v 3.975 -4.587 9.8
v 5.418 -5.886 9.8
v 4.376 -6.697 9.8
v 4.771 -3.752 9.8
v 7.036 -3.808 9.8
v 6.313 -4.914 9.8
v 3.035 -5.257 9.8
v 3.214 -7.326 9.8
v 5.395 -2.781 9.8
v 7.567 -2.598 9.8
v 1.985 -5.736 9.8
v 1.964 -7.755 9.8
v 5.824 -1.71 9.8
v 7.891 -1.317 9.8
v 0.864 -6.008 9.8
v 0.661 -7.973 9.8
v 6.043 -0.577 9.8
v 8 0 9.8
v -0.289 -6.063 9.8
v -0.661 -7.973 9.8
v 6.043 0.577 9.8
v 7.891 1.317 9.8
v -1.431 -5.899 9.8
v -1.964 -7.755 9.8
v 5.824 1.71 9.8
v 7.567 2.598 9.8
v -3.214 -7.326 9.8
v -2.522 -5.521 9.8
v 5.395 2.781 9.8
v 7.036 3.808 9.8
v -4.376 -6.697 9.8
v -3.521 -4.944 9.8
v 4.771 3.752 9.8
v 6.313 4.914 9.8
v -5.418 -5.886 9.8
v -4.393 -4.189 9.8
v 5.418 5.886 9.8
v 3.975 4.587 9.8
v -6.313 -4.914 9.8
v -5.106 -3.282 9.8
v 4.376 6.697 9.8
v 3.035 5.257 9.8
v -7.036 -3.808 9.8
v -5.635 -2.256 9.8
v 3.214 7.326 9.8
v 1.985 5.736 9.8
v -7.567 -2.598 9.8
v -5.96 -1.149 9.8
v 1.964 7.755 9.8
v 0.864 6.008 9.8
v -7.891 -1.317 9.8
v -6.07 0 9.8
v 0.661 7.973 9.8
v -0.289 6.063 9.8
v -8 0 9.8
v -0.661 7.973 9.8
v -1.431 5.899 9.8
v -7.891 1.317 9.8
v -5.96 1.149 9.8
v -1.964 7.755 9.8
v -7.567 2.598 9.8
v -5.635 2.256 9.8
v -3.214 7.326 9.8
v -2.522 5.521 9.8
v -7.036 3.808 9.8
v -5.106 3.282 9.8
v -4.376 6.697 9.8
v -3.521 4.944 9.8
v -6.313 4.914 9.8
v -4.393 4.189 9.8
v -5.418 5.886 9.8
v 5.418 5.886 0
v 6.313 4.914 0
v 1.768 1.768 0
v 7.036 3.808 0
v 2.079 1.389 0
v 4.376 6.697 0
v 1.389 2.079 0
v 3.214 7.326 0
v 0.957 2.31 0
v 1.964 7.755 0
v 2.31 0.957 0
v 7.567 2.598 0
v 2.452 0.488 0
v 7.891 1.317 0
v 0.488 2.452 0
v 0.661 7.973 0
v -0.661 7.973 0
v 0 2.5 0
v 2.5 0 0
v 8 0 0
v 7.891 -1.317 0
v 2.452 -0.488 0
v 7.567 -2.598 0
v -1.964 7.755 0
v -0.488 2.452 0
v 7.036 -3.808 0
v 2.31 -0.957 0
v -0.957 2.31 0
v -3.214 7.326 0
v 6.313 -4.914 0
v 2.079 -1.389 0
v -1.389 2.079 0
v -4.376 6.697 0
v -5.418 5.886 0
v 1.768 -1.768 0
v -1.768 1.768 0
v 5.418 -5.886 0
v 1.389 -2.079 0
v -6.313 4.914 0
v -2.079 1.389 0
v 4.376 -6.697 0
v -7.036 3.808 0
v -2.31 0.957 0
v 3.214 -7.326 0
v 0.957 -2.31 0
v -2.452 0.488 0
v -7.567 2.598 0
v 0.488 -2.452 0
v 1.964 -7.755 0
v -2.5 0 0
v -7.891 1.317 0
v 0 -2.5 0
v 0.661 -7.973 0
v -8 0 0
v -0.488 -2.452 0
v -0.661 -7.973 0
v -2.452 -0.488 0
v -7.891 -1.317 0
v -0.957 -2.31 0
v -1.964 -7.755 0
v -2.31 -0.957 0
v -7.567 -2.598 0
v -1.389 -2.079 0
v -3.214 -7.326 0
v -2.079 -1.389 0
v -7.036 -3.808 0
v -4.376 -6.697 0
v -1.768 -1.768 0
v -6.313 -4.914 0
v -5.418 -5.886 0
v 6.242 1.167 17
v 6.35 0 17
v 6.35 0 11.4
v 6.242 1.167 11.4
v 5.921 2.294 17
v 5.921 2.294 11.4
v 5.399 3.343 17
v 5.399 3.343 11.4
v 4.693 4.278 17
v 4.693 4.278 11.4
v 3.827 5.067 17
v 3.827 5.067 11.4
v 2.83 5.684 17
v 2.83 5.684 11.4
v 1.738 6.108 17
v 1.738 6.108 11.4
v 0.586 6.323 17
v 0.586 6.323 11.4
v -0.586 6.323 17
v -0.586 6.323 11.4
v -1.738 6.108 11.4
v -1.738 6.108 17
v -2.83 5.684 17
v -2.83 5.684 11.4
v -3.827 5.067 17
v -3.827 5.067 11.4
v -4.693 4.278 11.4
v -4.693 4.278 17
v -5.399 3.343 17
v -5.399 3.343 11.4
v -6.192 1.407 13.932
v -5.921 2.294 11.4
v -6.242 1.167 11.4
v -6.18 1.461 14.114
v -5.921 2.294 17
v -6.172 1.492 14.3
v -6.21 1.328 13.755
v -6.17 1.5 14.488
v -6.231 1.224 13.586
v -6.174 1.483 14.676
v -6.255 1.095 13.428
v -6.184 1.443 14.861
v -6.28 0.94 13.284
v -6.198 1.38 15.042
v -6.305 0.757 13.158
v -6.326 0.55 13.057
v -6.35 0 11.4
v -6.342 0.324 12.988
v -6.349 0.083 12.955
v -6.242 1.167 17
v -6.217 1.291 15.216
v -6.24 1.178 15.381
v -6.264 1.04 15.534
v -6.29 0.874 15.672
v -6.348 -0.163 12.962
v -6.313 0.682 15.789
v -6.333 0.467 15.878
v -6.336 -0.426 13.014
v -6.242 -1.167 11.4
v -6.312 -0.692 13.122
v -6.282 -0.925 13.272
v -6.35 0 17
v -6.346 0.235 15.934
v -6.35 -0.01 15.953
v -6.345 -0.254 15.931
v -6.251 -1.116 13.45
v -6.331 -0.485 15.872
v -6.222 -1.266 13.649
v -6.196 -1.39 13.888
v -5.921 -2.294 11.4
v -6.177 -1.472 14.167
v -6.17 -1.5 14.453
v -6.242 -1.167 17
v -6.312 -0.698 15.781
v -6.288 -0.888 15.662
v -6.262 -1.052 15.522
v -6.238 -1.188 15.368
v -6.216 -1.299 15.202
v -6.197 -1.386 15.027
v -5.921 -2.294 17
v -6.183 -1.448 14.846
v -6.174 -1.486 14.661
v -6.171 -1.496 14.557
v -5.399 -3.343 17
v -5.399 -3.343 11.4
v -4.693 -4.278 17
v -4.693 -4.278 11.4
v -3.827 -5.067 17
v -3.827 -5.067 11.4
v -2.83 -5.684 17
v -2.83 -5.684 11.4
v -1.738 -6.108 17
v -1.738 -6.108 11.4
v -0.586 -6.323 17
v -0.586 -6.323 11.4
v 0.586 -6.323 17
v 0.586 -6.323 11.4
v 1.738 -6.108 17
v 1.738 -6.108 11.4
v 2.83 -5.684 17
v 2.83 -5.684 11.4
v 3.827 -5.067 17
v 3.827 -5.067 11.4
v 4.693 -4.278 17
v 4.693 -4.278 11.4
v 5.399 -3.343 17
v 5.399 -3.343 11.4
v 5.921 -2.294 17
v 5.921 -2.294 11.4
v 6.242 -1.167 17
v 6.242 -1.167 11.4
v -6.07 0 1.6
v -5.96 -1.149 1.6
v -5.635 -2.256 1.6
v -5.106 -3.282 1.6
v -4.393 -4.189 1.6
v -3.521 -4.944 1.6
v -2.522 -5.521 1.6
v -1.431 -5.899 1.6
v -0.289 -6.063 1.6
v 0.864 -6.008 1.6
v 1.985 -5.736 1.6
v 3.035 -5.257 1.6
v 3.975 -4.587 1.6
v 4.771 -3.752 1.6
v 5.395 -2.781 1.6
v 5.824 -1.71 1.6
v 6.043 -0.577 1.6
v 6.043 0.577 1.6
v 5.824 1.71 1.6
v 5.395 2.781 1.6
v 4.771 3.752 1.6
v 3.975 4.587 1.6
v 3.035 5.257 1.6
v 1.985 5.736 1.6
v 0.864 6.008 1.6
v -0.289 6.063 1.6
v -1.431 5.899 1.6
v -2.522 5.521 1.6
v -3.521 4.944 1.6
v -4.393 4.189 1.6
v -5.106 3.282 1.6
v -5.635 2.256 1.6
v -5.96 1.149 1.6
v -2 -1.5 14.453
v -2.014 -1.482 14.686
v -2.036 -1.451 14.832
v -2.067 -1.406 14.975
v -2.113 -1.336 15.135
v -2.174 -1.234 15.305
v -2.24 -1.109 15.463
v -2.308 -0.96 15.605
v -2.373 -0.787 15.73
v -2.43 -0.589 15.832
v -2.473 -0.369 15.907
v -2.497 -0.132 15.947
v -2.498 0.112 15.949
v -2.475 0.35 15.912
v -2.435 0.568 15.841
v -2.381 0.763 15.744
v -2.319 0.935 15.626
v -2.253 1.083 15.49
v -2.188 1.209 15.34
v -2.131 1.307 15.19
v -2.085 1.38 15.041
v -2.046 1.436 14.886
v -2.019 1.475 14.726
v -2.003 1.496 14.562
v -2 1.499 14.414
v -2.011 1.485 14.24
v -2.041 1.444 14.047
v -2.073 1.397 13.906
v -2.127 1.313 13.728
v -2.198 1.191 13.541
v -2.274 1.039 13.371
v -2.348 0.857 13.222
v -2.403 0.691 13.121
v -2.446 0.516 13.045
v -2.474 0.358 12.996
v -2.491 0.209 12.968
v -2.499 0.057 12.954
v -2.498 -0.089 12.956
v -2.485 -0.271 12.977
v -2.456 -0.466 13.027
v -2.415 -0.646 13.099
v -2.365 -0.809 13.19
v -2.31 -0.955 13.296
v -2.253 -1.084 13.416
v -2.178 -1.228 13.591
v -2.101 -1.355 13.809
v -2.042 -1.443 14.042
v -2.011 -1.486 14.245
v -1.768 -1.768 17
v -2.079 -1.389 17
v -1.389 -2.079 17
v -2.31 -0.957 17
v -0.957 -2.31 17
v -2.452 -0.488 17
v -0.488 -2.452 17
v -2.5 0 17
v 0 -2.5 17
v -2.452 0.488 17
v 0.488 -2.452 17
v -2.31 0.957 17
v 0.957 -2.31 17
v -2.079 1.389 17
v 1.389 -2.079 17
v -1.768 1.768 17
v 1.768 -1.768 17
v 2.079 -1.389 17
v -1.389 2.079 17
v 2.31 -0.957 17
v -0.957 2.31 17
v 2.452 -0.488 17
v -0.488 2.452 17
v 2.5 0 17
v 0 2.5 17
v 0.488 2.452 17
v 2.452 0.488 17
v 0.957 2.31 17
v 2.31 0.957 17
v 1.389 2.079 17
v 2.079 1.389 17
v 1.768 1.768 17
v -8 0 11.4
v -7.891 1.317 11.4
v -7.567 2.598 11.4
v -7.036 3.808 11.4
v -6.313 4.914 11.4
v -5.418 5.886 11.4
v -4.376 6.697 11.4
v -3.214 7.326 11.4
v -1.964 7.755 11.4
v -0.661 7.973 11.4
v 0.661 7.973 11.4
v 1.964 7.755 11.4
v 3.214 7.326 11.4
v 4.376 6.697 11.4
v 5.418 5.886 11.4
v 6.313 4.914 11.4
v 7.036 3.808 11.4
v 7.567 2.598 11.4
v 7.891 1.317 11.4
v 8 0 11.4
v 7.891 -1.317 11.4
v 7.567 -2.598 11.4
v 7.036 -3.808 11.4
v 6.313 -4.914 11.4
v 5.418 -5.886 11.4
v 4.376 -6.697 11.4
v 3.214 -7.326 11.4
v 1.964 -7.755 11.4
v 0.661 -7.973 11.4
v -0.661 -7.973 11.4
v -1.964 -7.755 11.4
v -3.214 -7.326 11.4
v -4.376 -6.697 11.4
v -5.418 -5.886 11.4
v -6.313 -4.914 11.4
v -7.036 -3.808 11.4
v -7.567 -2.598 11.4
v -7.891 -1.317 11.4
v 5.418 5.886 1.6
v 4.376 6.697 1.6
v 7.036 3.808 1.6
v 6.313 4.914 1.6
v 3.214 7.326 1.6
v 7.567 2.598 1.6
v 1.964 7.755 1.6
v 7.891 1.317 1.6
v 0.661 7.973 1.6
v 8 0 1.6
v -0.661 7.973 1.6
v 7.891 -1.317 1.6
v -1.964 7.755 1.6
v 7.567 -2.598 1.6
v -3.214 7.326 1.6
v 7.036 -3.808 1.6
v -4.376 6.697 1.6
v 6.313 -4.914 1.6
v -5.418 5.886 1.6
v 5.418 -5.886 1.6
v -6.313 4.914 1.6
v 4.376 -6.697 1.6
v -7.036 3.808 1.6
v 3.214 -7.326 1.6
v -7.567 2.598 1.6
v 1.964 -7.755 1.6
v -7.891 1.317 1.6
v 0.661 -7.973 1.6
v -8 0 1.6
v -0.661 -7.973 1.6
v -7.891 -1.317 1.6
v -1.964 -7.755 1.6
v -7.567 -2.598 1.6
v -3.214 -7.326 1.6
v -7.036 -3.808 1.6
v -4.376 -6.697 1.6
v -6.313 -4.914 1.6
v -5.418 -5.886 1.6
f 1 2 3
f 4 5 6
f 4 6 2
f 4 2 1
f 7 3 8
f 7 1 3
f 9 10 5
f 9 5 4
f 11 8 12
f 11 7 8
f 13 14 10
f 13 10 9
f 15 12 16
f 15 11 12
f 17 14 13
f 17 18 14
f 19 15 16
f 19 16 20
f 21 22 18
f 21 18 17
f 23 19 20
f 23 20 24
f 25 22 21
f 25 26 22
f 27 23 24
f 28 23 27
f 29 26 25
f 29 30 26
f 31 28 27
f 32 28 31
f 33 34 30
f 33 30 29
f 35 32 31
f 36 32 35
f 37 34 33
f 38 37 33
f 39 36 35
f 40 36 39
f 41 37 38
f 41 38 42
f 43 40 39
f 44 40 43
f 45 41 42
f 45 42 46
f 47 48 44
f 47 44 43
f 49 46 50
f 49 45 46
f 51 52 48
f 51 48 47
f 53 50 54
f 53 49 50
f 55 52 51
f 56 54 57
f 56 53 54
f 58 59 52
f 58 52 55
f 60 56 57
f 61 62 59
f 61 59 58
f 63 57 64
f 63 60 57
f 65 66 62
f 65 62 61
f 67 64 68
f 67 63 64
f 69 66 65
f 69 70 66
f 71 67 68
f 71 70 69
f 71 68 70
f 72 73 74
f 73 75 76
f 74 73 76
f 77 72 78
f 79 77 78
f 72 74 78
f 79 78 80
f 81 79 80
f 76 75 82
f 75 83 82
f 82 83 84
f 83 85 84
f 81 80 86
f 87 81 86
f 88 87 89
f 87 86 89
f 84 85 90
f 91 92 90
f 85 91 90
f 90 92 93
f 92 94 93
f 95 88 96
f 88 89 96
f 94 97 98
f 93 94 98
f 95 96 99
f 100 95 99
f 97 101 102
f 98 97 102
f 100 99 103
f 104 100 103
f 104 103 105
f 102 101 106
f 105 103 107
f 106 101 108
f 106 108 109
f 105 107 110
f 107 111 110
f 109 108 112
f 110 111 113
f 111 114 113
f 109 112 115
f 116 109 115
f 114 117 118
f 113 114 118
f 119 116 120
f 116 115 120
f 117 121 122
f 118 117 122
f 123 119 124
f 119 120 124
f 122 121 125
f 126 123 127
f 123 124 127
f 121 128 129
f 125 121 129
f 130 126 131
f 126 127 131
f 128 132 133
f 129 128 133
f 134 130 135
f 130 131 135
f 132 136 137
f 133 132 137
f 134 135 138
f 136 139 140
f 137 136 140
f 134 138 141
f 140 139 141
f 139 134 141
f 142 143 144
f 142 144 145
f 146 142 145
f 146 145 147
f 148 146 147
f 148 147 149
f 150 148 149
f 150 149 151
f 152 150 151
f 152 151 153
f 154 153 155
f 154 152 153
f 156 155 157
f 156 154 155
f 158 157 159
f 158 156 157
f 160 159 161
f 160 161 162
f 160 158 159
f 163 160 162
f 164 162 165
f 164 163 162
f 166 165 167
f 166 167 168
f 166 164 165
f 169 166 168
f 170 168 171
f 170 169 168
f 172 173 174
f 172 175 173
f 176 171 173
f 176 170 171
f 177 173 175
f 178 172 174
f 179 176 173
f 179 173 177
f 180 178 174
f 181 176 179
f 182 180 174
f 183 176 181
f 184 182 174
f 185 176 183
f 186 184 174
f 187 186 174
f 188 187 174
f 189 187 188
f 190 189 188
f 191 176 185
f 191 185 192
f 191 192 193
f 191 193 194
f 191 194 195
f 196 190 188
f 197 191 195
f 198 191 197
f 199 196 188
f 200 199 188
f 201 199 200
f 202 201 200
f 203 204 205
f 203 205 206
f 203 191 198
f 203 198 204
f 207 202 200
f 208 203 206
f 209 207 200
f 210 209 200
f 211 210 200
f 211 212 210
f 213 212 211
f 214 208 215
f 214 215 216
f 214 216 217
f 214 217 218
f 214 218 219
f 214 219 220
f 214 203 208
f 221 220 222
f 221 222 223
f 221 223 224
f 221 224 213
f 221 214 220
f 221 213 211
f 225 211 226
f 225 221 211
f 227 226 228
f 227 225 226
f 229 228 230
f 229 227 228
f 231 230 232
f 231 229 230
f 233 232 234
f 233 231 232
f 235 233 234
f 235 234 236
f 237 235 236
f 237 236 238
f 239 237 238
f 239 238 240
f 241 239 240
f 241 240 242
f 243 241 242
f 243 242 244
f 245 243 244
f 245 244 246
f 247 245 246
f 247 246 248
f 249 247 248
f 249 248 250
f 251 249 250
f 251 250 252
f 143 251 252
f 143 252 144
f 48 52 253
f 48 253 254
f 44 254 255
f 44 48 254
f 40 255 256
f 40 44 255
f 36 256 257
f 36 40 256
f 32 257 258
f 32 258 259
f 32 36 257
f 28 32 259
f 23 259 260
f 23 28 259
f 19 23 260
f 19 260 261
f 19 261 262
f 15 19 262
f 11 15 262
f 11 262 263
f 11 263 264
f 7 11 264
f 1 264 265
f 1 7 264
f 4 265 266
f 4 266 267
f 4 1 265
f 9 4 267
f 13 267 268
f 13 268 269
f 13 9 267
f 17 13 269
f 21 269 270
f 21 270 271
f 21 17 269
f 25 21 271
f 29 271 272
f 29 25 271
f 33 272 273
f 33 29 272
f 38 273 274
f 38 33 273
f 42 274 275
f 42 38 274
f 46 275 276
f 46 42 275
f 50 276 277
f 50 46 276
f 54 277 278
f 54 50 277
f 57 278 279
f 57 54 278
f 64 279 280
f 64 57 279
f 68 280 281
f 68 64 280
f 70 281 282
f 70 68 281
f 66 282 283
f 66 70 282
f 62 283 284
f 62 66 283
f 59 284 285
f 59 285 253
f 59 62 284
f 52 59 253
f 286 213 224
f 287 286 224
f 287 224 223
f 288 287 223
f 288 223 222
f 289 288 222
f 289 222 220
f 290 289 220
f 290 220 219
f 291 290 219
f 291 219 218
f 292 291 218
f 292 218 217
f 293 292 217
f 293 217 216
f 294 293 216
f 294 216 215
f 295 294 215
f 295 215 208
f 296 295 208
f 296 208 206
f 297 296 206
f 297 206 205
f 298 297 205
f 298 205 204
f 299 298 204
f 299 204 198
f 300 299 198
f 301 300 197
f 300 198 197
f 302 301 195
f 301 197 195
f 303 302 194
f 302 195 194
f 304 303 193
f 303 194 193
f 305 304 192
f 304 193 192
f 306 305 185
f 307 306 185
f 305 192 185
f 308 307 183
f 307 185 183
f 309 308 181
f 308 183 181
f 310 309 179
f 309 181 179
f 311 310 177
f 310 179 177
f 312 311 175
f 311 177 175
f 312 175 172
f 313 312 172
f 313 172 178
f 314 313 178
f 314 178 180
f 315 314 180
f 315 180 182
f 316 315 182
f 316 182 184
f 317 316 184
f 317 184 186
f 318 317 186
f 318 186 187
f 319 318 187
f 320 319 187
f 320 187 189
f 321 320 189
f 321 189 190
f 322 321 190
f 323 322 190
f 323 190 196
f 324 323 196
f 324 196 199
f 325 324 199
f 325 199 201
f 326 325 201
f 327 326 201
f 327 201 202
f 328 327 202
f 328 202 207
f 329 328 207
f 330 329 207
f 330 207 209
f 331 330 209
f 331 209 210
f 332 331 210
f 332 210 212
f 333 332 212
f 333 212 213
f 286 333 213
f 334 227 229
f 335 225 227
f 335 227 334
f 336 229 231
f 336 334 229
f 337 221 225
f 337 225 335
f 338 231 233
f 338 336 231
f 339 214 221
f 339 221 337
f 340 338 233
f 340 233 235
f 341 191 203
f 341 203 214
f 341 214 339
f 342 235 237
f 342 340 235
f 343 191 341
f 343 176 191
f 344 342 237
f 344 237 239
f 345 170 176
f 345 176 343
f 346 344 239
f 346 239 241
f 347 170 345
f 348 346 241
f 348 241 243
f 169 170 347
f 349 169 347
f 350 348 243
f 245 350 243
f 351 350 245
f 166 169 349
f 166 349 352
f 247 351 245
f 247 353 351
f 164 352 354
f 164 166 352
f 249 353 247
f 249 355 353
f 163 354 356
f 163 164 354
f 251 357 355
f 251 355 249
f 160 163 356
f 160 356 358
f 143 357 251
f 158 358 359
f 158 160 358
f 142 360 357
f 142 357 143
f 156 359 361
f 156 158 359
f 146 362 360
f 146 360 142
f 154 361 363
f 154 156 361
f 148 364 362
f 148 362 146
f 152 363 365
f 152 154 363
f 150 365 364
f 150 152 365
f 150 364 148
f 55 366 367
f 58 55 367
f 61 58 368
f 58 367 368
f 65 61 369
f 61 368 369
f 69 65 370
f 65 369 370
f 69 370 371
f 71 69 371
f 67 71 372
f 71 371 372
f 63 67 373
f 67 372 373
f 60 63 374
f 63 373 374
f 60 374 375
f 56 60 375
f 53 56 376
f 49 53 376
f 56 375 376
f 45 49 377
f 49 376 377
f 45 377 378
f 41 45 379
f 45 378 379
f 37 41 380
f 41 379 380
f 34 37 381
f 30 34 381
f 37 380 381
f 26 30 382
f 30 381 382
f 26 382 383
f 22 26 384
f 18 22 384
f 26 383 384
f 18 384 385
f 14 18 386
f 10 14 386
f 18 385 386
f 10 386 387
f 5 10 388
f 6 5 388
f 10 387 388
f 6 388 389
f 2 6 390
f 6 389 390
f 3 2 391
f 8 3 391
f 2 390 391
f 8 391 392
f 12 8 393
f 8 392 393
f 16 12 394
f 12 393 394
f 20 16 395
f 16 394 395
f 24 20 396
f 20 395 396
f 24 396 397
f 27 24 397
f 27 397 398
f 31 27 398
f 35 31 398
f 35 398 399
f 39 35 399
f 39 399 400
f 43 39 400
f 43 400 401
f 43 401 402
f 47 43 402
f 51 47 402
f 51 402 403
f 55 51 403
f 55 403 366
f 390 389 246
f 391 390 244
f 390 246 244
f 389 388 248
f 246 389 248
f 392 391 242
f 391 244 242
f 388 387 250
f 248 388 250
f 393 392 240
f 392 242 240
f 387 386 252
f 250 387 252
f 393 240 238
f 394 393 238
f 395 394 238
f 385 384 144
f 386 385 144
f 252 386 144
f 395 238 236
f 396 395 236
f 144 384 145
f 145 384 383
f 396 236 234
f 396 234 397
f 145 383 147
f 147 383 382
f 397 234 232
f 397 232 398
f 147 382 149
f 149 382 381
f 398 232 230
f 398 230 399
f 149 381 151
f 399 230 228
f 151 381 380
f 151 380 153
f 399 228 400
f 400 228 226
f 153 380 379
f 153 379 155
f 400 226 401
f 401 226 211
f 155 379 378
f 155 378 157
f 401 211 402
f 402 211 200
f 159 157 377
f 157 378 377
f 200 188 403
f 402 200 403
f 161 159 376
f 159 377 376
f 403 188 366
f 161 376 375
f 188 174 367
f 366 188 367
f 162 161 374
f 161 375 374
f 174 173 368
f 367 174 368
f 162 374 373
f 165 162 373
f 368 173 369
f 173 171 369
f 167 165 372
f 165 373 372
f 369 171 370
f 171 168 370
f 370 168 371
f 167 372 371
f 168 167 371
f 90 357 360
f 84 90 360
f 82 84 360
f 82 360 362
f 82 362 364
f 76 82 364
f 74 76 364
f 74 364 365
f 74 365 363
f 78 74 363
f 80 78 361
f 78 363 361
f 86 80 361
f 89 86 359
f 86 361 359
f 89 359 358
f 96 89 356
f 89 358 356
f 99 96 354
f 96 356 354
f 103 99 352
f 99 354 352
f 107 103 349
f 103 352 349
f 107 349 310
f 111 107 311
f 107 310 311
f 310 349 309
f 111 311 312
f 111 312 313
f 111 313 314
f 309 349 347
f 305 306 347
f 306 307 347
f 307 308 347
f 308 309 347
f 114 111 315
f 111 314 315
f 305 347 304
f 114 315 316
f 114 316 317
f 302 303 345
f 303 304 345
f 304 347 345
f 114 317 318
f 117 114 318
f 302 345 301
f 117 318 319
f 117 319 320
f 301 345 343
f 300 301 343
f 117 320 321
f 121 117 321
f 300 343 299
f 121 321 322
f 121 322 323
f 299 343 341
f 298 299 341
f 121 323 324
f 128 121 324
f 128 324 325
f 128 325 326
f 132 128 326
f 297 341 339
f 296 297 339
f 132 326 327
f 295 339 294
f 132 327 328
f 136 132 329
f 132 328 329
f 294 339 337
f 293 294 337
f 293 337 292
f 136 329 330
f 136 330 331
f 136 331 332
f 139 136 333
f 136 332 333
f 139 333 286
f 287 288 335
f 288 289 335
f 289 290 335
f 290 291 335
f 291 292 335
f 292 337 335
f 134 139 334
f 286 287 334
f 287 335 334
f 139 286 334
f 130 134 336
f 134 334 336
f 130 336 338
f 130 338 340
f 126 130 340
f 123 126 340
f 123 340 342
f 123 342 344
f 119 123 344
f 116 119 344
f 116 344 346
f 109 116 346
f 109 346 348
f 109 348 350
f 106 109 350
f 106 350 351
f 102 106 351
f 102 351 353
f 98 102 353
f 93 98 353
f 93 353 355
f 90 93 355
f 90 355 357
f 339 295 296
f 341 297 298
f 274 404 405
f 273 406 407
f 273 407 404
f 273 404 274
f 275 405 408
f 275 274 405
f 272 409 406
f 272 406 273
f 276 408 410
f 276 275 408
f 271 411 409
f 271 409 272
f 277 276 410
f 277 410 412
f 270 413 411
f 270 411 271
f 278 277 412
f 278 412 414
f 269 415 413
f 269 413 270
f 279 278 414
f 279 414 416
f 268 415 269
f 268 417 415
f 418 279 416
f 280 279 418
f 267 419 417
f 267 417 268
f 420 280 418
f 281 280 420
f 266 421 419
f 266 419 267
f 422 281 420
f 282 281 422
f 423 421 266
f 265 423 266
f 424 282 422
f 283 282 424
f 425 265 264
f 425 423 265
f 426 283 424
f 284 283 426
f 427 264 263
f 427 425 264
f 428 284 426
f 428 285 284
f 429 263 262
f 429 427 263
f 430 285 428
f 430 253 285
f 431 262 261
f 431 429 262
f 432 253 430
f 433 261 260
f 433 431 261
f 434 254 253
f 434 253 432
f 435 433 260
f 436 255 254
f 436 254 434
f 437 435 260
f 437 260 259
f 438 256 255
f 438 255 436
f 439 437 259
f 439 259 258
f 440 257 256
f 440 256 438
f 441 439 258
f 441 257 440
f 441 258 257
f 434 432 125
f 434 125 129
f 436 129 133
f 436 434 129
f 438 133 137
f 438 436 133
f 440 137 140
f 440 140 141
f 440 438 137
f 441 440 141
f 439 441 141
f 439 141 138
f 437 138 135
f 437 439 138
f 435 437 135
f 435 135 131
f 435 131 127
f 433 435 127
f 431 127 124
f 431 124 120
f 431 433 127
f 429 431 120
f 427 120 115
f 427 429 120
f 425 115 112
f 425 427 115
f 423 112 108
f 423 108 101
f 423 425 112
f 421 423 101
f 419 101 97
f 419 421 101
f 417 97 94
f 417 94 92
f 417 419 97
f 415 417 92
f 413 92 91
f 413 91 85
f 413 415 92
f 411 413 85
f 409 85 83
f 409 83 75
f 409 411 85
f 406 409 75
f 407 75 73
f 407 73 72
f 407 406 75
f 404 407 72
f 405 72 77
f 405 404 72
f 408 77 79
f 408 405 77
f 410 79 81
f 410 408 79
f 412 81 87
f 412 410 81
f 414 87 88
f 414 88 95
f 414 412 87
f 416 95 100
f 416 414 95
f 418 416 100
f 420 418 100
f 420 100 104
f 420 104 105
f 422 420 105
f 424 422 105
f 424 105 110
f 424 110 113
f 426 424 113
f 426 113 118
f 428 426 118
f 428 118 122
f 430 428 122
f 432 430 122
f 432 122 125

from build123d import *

# Parameters (mm, degrees)
SKETCH1_R                     = 8
BOSS_EXTRUDE1_DEPTH           = 1.6
SKETCH2_R                     = 6.07
BOSS_EXTRUDE2_DEPTH           = 8.2
BOSS_EXTRUDE3_START           = -1.6
SKETCH3_R                     = 8
BOSS_EXTRUDE3_DEPTH           = 1.6
SKETCH4_R                     = 6.35
BOSS_EXTRUDE4_DEPTH           = 5.6
F_5_0_5_DIAMETER_HOLE1_D      = 5
F_3_0_3_DIAMETER_HOLE1_REACH  = 23.882
F_3_0_3_DIAMETER_HOLE1_BORE_R = 1.5


with BuildPart() as part:
    # Sketch1 → Boss-Extrude1 (new body)
    with BuildSketch(Plane.XY.offset(1.6)):
        with Locations(Location((0, 0, 0), (0, 0, 180))):
            Circle(SKETCH1_R)
    extrude(amount=-BOSS_EXTRUDE1_DEPTH)

    # Sketch2 → Boss-Extrude2 (add)
    with BuildSketch(Plane.XY.offset(9.8)):
        with Locations(Location((0, 0, 0), (0, 0, 180))):
            Circle(SKETCH2_R)
    extrude(amount=-BOSS_EXTRUDE2_DEPTH)

    # Sketch3 → Boss-Extrude3 (add)
    with BuildSketch(Plane(origin=(0, 0, 9.8), x_dir=(-1, 0, 0), z_dir=(0, 0, -1)).offset(BOSS_EXTRUDE3_START)):
        Circle(SKETCH3_R)
    extrude(amount=BOSS_EXTRUDE3_DEPTH)

    # Sketch4 → Boss-Extrude4 (add)
    with BuildSketch(Plane.XY.offset(17)):
        Circle(SKETCH4_R)
    extrude(amount=-BOSS_EXTRUDE4_DEPTH)

    # Ø5.0 (5) Diameter Hole1 (through all)
    with Locations(Plane(origin=(0, 0, 0), x_dir=(-1, 0, 0), z_dir=(0, 0, -1))):
        with Locations((0, 0)):
            Hole(F_5_0_5_DIAMETER_HOLE1_D / 2)

    # Ø3.0 (3) Diameter Hole1 bore (on position points) → Ø3.0 (3) Diameter Hole1 (cut, up to next)
    with BuildSketch(Plane(origin=(-6.35, 0, 14.452836514), x_dir=(0, -1, 0), z_dir=(-1, 0, 0)), mode=Mode.PRIVATE) as f_3_0_3_diameter_hole1_sk1:
        Circle(F_3_0_3_DIAMETER_HOLE1_BORE_R)
    f_3_0_3_diameter_hole1_tool1 = extrude(f_3_0_3_diameter_hole1_sk1.sketch, amount=-F_3_0_3_DIAMETER_HOLE1_REACH, mode=Mode.PRIVATE) & part.part
    add(f_3_0_3_diameter_hole1_tool1.solids().sort_by_distance((-6.35, 0, 14.452837))[0], mode=Mode.SUBTRACT)


solid = part.part
